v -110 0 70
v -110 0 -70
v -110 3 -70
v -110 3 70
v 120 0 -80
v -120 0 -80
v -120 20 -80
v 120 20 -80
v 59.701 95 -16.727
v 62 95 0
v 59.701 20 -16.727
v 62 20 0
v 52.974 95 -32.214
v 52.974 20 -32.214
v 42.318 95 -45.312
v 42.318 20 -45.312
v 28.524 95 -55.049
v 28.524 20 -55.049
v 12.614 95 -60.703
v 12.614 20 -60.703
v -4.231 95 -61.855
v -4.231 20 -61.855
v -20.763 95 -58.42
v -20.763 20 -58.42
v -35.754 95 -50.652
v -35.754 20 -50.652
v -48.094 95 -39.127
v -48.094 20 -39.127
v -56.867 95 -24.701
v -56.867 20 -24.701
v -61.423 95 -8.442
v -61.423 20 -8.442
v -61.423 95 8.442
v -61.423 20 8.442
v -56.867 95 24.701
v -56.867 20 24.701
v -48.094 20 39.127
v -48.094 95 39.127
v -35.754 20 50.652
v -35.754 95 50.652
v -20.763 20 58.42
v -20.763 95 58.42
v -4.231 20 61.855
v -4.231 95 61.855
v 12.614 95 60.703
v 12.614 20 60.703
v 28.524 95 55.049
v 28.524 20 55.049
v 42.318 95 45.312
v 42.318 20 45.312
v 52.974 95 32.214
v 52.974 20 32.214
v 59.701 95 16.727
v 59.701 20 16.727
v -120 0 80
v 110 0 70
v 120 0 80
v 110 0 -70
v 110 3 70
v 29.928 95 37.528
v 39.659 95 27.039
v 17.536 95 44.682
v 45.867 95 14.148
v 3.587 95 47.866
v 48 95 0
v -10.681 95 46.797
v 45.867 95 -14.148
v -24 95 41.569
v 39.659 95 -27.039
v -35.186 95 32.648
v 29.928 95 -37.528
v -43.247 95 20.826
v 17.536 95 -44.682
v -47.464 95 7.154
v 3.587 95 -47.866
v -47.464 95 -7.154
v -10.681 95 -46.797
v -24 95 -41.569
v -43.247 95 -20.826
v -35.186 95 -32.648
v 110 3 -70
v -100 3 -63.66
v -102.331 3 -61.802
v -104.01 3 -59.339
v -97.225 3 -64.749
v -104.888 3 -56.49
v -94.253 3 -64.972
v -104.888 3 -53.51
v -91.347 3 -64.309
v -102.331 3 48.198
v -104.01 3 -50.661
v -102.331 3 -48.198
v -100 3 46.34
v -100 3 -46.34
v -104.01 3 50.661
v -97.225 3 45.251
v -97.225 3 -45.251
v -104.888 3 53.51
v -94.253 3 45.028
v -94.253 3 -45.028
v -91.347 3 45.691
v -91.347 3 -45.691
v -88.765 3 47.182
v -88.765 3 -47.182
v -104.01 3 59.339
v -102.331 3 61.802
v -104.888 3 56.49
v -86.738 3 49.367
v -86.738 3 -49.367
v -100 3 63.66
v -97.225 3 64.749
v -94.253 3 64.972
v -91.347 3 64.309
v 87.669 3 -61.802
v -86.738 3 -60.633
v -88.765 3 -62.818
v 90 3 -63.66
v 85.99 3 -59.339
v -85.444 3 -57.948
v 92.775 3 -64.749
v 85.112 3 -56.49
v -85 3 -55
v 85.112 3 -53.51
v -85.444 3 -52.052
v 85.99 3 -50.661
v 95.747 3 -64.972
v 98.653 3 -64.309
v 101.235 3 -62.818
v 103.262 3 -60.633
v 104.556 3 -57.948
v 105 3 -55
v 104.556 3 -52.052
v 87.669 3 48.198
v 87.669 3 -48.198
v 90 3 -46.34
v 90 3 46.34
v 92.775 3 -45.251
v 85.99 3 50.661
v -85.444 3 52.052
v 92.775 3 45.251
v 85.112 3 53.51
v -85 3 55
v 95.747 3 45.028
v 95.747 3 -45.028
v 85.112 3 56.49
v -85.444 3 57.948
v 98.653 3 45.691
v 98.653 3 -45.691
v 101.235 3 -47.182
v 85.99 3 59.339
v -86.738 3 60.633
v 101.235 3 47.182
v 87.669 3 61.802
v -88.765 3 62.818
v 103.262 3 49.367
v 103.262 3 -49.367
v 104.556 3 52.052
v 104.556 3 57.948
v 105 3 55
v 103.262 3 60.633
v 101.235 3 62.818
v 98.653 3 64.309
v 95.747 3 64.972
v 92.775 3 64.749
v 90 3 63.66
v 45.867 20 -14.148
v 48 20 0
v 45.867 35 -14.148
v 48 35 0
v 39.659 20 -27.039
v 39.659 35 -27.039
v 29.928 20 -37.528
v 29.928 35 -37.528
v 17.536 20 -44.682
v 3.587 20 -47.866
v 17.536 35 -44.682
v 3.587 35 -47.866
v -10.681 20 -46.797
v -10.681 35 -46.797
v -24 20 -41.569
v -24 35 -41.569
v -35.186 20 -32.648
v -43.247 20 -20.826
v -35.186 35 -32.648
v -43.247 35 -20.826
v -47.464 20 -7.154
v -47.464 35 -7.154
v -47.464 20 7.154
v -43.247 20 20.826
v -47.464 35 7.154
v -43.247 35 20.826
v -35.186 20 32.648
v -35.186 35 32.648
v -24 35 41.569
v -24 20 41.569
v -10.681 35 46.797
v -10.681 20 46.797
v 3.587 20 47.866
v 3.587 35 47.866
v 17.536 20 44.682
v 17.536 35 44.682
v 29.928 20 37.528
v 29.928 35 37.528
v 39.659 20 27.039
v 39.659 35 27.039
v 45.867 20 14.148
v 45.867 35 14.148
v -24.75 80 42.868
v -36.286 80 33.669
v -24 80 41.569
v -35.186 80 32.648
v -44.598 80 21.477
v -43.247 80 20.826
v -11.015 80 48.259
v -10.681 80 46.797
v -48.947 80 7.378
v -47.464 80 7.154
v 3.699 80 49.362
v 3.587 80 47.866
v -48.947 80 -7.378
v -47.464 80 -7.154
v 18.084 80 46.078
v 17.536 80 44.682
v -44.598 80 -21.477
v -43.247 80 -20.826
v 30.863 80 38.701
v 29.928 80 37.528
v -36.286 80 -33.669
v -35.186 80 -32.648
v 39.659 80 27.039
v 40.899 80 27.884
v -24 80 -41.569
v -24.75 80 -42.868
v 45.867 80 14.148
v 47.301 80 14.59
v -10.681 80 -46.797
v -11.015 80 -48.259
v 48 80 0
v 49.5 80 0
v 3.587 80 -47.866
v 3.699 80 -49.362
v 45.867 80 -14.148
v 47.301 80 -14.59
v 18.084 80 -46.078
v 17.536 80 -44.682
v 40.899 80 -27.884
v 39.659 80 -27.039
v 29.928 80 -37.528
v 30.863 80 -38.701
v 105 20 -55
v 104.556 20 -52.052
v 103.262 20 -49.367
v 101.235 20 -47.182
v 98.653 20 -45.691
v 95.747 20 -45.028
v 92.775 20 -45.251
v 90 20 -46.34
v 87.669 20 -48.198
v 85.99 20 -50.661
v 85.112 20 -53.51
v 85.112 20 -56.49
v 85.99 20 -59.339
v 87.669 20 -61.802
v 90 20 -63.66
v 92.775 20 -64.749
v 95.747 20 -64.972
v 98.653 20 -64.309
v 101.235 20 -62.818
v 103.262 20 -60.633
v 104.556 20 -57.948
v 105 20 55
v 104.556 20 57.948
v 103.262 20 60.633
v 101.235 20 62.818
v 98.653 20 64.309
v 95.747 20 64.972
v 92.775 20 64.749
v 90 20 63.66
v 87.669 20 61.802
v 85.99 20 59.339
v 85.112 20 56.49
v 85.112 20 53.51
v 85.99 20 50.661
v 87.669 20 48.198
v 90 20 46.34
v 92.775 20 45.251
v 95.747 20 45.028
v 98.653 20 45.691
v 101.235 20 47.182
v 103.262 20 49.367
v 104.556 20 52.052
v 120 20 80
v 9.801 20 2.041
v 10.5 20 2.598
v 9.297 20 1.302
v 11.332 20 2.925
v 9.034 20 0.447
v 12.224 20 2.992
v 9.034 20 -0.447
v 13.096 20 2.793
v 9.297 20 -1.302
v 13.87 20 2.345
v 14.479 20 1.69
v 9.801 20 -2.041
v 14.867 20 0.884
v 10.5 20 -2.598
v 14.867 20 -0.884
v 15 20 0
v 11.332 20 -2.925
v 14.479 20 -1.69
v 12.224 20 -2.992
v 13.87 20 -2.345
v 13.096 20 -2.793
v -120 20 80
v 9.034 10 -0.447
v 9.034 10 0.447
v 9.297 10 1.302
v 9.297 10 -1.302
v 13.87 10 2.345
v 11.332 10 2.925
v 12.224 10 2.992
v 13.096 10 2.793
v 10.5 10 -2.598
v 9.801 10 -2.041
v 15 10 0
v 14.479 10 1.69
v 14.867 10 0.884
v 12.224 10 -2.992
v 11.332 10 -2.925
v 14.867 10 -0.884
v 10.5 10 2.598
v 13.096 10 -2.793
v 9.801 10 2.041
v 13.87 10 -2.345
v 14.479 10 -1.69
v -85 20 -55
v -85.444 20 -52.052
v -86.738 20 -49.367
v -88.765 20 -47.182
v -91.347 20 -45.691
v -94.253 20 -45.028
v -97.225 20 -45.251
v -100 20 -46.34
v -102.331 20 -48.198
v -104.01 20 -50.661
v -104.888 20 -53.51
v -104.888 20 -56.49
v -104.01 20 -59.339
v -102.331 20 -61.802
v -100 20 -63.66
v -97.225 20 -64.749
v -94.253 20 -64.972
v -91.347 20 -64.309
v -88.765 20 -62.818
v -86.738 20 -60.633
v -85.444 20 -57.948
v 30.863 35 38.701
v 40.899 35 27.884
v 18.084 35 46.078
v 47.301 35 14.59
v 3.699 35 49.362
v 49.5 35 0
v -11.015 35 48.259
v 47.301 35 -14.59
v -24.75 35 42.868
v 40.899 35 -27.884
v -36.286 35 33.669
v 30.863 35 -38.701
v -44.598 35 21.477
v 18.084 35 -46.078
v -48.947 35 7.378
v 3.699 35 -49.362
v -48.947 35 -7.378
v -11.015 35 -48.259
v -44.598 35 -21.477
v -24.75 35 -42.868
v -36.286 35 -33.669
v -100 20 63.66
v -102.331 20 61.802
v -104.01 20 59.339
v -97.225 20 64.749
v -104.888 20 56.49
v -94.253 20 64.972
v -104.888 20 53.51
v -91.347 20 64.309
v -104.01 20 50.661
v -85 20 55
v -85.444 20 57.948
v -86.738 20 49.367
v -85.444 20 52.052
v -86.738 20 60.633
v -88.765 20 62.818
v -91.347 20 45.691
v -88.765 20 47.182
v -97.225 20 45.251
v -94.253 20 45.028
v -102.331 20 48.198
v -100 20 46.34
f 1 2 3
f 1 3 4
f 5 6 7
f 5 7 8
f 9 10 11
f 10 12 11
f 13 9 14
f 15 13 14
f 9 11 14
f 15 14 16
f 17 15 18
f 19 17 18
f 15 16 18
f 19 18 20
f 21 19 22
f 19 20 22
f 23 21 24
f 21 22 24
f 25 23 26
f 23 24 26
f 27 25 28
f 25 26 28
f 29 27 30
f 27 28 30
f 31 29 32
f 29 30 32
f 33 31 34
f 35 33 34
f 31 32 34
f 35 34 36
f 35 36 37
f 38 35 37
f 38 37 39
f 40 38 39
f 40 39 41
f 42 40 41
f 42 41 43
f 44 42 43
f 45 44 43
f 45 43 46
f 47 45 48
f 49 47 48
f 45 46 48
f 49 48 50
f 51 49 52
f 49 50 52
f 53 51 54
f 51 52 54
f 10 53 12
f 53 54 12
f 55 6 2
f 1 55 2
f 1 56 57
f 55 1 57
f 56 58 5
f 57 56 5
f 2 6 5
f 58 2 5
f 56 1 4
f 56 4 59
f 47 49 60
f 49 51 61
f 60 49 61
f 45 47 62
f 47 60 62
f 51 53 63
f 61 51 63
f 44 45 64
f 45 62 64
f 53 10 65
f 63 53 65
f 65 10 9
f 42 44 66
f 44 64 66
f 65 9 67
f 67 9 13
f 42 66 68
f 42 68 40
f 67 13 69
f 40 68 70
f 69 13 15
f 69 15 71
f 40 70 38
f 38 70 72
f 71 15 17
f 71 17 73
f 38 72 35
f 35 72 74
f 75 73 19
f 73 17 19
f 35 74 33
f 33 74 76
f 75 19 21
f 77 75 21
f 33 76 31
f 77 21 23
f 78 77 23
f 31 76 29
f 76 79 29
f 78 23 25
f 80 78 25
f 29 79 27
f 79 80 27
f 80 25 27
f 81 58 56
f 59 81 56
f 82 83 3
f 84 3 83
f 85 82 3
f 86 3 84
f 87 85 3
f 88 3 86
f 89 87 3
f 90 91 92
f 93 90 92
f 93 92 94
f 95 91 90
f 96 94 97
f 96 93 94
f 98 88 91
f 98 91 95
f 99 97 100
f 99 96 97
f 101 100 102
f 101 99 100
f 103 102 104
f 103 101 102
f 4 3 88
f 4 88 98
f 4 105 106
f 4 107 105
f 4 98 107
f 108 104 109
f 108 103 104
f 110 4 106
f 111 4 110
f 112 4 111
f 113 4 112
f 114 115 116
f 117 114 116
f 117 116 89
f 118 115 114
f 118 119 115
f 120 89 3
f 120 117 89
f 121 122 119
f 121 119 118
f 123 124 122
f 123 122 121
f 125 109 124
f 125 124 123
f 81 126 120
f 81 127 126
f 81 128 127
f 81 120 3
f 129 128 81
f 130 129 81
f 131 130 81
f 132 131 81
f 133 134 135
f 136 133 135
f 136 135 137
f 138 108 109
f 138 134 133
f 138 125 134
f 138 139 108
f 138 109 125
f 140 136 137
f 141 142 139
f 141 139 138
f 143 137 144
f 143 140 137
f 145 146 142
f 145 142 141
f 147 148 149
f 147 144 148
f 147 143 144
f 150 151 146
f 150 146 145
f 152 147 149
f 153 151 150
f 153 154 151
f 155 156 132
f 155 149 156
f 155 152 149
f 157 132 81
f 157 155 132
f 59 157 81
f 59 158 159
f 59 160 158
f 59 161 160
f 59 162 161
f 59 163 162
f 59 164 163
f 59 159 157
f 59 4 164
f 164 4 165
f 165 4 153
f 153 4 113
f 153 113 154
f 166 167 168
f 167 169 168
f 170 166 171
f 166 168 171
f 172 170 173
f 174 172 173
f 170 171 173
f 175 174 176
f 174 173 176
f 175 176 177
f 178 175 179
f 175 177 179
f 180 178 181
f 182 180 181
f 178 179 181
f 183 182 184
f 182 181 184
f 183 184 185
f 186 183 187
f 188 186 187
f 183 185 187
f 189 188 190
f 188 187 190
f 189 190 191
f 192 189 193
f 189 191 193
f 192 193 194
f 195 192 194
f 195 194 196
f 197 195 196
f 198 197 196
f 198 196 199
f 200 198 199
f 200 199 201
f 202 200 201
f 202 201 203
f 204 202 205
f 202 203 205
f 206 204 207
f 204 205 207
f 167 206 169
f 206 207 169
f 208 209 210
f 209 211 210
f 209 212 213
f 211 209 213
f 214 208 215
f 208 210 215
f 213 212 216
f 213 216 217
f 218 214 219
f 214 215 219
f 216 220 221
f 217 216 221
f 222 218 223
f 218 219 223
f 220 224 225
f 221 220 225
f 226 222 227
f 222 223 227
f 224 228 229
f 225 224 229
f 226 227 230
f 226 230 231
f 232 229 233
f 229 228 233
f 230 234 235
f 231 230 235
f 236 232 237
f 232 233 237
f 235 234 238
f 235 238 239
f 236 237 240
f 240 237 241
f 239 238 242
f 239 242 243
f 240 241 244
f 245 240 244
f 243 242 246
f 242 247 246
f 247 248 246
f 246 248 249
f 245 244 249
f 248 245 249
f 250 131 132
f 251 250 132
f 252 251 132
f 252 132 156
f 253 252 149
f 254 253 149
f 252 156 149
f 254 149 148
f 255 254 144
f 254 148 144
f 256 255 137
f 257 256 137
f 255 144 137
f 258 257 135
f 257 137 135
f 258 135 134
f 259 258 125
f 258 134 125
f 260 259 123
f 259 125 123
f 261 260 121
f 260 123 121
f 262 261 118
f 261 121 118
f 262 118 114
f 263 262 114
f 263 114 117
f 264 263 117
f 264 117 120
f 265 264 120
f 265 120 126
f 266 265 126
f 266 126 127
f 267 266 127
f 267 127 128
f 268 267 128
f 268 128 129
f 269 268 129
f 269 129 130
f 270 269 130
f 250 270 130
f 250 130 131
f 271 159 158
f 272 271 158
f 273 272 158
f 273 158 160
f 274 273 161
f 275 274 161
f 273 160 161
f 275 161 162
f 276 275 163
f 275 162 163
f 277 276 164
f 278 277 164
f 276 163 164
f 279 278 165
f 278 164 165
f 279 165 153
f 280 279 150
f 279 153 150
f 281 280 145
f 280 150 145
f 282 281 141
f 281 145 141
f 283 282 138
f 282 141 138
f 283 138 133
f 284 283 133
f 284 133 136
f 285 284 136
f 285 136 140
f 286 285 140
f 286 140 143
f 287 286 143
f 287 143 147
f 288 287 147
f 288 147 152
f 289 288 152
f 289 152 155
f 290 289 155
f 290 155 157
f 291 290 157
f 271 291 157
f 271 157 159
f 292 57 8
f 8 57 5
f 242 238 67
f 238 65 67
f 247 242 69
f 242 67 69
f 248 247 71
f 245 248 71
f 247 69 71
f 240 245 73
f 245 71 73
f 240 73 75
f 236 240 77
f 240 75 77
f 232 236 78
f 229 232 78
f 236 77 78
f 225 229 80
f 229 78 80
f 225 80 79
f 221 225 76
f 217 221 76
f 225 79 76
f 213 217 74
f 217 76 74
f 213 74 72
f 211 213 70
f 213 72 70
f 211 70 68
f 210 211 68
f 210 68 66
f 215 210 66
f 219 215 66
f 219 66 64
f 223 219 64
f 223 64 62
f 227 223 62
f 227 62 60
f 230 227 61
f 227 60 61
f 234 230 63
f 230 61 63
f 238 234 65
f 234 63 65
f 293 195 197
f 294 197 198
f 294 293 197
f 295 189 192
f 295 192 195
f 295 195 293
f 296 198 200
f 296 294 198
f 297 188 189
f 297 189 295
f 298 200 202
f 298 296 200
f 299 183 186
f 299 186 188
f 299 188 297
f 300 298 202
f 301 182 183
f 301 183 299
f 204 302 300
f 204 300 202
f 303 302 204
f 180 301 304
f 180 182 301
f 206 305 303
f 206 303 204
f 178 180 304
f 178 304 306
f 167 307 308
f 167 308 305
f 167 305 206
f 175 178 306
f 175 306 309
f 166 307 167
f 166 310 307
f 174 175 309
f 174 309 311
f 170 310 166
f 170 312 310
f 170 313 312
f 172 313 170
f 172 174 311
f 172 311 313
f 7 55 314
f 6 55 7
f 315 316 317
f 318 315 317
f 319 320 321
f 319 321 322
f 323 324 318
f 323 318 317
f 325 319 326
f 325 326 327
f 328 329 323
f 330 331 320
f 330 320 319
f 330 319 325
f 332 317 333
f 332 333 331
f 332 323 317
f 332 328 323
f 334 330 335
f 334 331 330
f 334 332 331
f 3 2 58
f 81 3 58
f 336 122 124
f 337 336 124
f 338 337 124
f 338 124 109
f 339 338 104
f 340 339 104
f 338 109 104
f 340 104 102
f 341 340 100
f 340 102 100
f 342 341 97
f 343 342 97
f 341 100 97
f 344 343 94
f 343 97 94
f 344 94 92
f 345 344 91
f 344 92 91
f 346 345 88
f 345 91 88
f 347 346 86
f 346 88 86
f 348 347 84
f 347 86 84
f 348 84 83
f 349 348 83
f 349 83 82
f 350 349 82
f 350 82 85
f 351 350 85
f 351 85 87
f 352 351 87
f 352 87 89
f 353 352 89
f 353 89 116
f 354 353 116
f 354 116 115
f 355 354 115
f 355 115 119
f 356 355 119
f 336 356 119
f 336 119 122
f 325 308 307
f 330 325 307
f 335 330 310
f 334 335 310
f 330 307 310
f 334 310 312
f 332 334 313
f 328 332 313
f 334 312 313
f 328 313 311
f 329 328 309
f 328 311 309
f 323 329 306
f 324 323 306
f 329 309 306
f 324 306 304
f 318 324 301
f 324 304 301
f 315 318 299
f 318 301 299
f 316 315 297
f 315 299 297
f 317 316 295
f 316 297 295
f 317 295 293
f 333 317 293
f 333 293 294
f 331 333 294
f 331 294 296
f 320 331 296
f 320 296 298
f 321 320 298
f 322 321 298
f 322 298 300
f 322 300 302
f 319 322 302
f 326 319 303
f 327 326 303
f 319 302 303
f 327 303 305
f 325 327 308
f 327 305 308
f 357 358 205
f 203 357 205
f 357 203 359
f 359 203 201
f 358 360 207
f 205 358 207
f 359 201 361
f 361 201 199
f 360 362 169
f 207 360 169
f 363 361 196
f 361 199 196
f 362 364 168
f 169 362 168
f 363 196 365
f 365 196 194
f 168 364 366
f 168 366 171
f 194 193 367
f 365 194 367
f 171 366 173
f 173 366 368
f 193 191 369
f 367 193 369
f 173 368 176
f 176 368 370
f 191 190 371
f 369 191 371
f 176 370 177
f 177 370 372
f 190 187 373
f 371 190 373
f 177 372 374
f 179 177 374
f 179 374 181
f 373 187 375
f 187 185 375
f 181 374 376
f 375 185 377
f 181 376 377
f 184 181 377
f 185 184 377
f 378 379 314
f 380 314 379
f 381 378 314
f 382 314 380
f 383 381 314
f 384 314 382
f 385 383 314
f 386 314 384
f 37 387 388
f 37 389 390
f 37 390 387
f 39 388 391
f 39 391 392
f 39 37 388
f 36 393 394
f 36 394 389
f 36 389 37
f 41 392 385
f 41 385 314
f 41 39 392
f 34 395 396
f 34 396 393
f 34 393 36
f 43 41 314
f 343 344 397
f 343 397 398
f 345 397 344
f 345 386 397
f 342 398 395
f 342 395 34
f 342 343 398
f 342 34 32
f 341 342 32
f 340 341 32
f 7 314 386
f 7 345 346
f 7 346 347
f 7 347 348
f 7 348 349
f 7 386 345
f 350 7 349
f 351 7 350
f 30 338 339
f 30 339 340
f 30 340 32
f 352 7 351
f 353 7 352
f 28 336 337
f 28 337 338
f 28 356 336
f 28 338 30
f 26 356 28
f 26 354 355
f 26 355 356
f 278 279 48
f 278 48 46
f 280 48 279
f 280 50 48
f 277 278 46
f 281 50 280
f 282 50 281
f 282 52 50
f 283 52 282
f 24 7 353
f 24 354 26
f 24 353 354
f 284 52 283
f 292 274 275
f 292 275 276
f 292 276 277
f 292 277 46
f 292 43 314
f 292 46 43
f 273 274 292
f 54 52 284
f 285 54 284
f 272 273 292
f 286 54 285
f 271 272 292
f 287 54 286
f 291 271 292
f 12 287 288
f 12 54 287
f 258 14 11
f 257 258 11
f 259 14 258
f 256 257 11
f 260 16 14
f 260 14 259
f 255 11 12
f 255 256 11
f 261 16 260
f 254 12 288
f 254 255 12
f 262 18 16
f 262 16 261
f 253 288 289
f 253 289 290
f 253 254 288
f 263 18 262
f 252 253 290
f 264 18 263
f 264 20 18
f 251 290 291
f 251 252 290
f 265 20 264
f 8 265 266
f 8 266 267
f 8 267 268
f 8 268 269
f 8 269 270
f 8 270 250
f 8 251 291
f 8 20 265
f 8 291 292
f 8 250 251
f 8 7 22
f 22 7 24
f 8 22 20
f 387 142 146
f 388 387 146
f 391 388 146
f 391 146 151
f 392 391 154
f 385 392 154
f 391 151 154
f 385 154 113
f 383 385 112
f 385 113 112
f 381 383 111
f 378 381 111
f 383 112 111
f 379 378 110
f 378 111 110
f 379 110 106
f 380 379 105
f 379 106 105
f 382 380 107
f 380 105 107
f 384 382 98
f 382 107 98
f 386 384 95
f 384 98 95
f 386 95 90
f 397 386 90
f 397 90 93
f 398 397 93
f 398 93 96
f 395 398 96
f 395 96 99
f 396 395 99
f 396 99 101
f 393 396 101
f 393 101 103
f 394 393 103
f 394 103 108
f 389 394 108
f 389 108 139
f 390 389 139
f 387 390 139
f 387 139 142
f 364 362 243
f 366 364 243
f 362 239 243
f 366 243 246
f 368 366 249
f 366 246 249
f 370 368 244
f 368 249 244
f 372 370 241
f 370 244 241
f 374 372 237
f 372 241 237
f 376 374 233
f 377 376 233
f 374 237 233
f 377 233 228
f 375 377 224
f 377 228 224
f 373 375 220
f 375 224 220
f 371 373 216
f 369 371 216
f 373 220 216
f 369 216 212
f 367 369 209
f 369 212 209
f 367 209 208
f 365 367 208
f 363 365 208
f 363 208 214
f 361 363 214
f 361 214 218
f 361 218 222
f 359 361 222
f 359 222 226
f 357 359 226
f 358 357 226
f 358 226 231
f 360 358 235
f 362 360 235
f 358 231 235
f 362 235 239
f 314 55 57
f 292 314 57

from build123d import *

# Parameters (mm, degrees)
SKETCH1_W           = 240
SKETCH1_H           = 160
BOSS_EXTRUDE2_DEPTH = 20
SKETCH5_R           = 10
CUT_EXTRUDE2_DEPTH  = 20
SKETCH6_W           = 220
SKETCH6_H           = 140
CUT_EXTRUDE3_DEPTH  = 3
SKETCH9_R           = 3
CUT_EXTRUDE4_DEPTH  = 10


with BuildPart() as part:
    # Sketch1 → Boss-Extrude2 (new body)
    with BuildSketch(Plane(origin=(0, 0, 0), x_dir=(1, 0, 0), z_dir=(0, 1, 0))):
        Rectangle(SKETCH1_W, SKETCH1_H)
    extrude(amount=BOSS_EXTRUDE2_DEPTH)

    # Sketch3 → Revolve1 (revolve)
    with BuildSketch(Plane.XY):
        Polygon((48, 20), (48, 35), (49.5, 35), (49.5, 80), (48, 80), (48, 95), (62, 95), (62, 20), align=None)
    revolve(axis=Axis((0, -30.427567953, 0), (0, 1, 0)))

    # Sketch5 → Cut-Extrude2 (cut)
    with BuildSketch(Plane.XZ):
        with Locations((95, 55)):
            Circle(SKETCH5_R)
        with Locations((-95, 55)):
            Circle(SKETCH5_R)
        with Locations((-95, -55)):
            Circle(SKETCH5_R)
        with Locations((95, -55)):
            Circle(SKETCH5_R)
    extrude(amount=-CUT_EXTRUDE2_DEPTH, mode=Mode.SUBTRACT)

    # Sketch6 → Cut-Extrude3 (cut)
    with BuildSketch(Plane.XZ):
        Rectangle(SKETCH6_W, SKETCH6_H)
    extrude(amount=-CUT_EXTRUDE3_DEPTH, mode=Mode.SUBTRACT)

    # Sketch9 → Cut-Extrude4 (cut)
    with BuildSketch(Plane(origin=(0, 20, 0), x_dir=(1, 0, 0), z_dir=(0, 1, 0))):
        with Locations((12, 0)):
            Circle(SKETCH9_R)
    extrude(amount=-CUT_EXTRUDE4_DEPTH, mode=Mode.SUBTRACT)


solid = part.part
